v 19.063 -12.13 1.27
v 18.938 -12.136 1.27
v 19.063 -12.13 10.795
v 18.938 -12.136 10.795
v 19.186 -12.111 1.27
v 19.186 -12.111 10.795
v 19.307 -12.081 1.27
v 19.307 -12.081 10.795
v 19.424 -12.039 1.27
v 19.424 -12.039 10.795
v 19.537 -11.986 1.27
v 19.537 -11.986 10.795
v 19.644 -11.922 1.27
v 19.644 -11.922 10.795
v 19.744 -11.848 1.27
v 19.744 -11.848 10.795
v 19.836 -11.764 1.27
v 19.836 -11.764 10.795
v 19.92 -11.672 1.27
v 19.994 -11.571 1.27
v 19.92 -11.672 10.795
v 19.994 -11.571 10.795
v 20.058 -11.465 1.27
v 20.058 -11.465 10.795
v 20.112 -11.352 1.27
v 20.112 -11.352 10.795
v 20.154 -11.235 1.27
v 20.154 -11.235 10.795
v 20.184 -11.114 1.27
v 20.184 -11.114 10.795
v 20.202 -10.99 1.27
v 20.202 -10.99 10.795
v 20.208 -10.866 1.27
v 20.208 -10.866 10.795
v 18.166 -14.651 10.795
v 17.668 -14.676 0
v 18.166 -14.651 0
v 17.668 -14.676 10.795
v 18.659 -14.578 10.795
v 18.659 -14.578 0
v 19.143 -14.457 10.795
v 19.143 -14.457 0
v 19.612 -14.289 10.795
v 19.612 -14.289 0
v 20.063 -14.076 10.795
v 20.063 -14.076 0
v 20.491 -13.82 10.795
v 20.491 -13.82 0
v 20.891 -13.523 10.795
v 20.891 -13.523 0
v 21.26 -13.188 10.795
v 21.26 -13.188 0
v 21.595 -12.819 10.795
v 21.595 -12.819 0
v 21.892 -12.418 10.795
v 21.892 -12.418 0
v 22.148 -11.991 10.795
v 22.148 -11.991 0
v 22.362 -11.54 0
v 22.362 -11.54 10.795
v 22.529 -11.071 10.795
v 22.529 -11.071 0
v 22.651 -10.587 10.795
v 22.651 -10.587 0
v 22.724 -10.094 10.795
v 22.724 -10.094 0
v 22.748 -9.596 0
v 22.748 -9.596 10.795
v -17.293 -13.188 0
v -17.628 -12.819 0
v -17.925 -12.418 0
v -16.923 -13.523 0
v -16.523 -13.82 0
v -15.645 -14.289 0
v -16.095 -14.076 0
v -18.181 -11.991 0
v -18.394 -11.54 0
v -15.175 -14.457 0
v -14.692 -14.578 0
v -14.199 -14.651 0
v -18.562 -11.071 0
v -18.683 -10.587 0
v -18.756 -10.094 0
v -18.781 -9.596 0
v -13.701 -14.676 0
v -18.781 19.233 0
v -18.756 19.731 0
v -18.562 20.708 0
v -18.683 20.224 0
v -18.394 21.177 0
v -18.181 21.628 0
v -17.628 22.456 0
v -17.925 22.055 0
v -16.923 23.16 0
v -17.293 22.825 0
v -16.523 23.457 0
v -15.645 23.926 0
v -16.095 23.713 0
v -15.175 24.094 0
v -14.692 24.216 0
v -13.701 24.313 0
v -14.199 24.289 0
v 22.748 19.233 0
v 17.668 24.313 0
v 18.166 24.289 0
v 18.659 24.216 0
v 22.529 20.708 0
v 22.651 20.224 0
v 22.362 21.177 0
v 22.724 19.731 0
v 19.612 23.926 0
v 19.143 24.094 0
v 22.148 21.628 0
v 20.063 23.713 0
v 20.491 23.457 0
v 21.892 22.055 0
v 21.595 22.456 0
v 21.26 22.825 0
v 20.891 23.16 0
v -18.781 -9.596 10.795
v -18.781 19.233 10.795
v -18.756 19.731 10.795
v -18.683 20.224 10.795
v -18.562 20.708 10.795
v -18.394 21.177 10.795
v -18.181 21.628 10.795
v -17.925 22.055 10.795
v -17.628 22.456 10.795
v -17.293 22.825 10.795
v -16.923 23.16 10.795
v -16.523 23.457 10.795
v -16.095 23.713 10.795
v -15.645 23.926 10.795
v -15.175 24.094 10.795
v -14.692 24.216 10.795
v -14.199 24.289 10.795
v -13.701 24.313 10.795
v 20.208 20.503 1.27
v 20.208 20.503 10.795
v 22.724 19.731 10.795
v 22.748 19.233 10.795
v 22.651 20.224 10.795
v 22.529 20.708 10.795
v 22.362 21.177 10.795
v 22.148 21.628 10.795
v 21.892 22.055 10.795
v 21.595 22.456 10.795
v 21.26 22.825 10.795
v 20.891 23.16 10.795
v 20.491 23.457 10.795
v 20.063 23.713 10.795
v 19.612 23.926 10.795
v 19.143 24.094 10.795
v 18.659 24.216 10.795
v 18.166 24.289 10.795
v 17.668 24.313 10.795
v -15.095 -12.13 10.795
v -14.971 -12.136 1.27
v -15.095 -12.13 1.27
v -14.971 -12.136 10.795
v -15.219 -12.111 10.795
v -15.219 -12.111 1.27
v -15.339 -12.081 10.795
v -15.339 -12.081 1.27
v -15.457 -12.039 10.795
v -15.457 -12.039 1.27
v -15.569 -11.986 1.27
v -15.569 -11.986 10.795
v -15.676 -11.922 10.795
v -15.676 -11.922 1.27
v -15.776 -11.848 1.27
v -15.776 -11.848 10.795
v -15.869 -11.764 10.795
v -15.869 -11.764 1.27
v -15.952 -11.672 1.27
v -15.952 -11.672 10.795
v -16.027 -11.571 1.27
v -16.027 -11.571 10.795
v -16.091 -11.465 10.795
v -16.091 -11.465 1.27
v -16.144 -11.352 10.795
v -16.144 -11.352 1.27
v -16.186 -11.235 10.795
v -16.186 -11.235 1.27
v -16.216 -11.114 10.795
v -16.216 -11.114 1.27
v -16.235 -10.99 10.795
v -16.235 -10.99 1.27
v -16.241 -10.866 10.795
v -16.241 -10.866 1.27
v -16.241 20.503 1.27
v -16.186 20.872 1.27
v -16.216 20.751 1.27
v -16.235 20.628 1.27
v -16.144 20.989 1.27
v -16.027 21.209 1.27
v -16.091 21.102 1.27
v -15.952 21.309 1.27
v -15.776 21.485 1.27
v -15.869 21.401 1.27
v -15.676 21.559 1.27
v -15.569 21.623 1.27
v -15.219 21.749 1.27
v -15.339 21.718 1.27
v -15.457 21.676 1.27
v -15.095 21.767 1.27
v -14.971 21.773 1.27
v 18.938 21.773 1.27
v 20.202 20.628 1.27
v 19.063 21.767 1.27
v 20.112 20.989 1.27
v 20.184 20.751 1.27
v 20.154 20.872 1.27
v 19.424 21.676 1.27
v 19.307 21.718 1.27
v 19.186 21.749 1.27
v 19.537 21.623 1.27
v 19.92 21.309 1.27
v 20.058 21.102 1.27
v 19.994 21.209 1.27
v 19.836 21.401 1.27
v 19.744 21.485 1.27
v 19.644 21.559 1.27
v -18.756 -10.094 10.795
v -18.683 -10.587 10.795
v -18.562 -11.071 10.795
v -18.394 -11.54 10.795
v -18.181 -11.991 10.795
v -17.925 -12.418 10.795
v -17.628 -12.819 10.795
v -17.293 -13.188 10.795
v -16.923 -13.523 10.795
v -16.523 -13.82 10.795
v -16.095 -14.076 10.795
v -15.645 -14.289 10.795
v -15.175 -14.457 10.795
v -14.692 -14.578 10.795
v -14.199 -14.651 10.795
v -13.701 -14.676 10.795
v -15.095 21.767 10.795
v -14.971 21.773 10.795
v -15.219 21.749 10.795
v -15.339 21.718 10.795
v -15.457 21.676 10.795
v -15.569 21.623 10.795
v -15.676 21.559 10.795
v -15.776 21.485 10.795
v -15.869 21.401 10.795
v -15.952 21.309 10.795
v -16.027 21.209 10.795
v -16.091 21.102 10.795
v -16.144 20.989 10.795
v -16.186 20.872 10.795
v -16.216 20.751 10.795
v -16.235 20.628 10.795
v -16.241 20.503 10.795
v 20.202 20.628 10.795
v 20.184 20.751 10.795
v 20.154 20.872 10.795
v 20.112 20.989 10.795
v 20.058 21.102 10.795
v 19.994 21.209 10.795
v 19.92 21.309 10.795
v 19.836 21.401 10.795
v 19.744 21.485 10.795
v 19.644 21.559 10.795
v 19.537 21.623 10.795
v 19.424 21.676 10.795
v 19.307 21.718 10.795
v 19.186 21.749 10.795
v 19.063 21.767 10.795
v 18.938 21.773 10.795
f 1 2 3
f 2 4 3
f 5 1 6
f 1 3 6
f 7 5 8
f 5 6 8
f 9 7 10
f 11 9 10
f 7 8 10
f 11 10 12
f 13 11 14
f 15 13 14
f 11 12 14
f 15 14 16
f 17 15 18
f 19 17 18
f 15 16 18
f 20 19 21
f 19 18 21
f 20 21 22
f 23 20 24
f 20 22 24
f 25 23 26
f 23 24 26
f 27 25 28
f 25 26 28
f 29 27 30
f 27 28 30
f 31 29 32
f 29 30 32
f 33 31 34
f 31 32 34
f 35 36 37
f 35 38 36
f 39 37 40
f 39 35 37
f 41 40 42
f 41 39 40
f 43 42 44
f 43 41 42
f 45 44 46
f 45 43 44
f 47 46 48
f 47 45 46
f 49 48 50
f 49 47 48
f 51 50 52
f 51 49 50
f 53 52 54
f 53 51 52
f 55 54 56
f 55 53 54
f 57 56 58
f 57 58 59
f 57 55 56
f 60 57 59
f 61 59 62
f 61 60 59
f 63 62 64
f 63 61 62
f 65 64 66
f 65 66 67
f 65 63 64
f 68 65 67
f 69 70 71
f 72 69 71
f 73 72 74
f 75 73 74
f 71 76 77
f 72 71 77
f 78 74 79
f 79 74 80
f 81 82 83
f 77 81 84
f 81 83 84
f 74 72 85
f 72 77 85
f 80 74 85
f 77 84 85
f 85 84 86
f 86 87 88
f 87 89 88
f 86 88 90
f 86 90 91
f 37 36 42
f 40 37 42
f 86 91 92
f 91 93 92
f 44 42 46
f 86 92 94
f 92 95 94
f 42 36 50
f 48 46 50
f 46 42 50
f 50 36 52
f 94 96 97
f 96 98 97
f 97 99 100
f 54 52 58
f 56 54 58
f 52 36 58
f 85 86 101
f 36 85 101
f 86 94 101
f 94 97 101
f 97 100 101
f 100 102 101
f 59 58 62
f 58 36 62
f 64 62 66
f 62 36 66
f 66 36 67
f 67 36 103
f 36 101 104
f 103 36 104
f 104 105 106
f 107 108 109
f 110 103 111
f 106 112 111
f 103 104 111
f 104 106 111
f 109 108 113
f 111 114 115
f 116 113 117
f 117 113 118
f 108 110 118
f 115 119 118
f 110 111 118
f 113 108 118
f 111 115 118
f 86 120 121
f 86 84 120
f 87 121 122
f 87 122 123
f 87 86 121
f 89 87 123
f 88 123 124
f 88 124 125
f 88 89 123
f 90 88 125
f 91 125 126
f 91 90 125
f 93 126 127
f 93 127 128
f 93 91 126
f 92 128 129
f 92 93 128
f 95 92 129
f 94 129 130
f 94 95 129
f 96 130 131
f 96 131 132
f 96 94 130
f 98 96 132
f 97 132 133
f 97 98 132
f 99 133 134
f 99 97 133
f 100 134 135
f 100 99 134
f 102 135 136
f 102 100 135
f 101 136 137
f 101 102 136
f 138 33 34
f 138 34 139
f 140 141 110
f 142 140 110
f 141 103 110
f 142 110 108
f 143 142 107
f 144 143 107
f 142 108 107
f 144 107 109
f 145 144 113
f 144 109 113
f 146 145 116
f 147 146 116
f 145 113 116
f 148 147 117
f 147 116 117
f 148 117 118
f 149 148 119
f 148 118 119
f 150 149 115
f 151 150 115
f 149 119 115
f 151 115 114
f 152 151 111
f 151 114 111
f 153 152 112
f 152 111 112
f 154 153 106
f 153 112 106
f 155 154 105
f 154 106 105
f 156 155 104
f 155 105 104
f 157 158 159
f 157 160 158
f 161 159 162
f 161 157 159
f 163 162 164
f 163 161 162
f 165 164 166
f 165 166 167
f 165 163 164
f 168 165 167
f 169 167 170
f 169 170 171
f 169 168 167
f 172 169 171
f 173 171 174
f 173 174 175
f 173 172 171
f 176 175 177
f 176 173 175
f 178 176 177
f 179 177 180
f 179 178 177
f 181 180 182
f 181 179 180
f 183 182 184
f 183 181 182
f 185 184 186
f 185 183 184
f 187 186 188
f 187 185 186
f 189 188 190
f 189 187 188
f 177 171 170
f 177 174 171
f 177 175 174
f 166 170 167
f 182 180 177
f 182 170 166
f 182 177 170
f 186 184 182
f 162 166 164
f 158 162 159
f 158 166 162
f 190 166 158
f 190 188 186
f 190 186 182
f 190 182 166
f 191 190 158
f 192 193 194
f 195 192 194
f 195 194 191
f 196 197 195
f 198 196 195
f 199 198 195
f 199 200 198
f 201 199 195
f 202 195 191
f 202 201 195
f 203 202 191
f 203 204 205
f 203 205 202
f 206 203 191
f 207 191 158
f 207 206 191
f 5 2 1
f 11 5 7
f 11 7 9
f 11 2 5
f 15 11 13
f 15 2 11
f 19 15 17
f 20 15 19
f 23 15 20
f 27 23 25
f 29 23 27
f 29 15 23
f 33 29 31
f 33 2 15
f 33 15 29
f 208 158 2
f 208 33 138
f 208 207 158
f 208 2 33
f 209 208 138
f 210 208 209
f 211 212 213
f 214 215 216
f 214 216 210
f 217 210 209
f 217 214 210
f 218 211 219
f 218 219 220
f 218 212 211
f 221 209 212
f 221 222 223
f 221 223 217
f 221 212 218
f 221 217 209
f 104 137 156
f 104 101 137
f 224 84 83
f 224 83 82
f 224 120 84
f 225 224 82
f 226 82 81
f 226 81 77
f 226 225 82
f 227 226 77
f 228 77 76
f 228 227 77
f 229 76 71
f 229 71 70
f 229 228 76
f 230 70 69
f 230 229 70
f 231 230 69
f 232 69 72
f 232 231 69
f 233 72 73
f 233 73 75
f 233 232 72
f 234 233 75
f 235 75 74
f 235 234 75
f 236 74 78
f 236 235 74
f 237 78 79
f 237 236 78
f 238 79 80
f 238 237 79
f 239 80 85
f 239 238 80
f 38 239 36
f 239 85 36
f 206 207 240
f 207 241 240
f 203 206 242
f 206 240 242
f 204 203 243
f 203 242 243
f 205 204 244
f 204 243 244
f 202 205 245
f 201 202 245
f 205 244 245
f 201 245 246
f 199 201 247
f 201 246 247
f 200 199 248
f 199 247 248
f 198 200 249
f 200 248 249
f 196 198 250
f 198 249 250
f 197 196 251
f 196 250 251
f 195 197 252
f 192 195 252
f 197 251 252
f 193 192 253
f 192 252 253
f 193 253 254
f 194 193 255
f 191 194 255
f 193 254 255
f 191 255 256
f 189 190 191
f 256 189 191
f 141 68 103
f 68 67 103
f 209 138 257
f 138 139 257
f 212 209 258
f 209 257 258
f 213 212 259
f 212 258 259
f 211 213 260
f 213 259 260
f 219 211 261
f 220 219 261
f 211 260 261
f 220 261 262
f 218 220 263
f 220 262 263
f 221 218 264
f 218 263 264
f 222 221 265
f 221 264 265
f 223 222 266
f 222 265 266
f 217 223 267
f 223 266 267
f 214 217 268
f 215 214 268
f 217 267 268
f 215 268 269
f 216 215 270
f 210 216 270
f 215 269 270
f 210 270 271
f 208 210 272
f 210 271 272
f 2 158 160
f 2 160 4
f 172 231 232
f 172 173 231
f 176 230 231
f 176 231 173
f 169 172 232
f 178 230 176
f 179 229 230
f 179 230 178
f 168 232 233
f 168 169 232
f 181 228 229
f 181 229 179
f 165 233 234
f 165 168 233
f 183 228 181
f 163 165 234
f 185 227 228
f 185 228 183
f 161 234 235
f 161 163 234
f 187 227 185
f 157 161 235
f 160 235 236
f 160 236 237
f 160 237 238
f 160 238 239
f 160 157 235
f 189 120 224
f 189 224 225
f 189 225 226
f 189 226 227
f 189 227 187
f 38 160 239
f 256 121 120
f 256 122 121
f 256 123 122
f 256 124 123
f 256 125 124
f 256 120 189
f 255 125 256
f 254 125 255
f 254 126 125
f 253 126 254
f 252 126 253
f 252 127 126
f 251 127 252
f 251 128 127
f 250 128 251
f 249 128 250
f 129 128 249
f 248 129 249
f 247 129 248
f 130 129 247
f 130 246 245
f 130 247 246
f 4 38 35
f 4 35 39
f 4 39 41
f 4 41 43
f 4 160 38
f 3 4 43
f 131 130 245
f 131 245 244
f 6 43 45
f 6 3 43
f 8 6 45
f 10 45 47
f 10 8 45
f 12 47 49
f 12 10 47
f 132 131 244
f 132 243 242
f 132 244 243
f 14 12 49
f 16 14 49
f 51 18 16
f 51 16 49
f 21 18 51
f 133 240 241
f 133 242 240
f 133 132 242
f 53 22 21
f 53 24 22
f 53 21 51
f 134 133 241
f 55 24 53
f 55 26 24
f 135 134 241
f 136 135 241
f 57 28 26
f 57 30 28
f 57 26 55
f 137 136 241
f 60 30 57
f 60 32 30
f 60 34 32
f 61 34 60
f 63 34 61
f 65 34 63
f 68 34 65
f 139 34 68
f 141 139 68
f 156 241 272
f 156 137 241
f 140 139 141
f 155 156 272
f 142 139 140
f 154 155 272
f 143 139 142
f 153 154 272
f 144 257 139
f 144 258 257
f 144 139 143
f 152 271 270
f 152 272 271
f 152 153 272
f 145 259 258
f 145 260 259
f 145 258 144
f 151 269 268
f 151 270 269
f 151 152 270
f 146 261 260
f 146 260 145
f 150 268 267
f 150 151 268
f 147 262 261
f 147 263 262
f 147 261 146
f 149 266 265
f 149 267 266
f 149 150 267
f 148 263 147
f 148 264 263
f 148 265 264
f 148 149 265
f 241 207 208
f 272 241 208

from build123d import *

# Parameters (mm, degrees)
F0_W     = 41.529
F0_H     = 38.989
F1_DEPTH = 1.27
F2_W     = 41.529
F2_H     = 38.989
F2_W_2   = 36.449
F2_H_2   = 33.909
F3_DEPTH = 9.525
F4_R     = 5.08
F5_R     = 1.27


with BuildPart() as f1:
    # F0 (on Top) → F1 (new body)
    with BuildSketch(Plane.XY):
        with Locations((1.983731, 4.818643)):
            Rectangle(F0_W, F0_H)
    extrude(amount=F1_DEPTH)

    # F2 (on face) → F3 (join)
    with BuildSketch(Plane.XY.offset(1.27)):
        with Locations((1.983731, 4.818643)):
            Rectangle(F2_W, F2_H)
        with Locations((1.983731, 4.818643)):
            Rectangle(F2_W_2, F2_H_2, mode=Mode.SUBTRACT)
    extrude(amount=F3_DEPTH)

    # F4
    f4_edges = [f1.edges().sort_by_distance(p)[0] for p in [
        (-18.780769, 24.313143, 5.3975),
        (22.748231, 24.313143, 5.3975),
        (22.748231, -14.675857, 5.3975),
        (-18.780769, -14.675857, 5.3975),
    ]]
    fillet(f4_edges, radius=F4_R)

    # F5
    f5_edges = [f1.edges().sort_by_distance(p)[0] for p in [
        (-16.240769, 21.773143, 6.0325),
        (20.208231, 21.773143, 6.0325),
        (20.208231, -12.135857, 6.0325),
        (-16.240769, -12.135857, 6.0325),
    ]]
    fillet(f5_edges, radius=F5_R)


solid = f1.part
